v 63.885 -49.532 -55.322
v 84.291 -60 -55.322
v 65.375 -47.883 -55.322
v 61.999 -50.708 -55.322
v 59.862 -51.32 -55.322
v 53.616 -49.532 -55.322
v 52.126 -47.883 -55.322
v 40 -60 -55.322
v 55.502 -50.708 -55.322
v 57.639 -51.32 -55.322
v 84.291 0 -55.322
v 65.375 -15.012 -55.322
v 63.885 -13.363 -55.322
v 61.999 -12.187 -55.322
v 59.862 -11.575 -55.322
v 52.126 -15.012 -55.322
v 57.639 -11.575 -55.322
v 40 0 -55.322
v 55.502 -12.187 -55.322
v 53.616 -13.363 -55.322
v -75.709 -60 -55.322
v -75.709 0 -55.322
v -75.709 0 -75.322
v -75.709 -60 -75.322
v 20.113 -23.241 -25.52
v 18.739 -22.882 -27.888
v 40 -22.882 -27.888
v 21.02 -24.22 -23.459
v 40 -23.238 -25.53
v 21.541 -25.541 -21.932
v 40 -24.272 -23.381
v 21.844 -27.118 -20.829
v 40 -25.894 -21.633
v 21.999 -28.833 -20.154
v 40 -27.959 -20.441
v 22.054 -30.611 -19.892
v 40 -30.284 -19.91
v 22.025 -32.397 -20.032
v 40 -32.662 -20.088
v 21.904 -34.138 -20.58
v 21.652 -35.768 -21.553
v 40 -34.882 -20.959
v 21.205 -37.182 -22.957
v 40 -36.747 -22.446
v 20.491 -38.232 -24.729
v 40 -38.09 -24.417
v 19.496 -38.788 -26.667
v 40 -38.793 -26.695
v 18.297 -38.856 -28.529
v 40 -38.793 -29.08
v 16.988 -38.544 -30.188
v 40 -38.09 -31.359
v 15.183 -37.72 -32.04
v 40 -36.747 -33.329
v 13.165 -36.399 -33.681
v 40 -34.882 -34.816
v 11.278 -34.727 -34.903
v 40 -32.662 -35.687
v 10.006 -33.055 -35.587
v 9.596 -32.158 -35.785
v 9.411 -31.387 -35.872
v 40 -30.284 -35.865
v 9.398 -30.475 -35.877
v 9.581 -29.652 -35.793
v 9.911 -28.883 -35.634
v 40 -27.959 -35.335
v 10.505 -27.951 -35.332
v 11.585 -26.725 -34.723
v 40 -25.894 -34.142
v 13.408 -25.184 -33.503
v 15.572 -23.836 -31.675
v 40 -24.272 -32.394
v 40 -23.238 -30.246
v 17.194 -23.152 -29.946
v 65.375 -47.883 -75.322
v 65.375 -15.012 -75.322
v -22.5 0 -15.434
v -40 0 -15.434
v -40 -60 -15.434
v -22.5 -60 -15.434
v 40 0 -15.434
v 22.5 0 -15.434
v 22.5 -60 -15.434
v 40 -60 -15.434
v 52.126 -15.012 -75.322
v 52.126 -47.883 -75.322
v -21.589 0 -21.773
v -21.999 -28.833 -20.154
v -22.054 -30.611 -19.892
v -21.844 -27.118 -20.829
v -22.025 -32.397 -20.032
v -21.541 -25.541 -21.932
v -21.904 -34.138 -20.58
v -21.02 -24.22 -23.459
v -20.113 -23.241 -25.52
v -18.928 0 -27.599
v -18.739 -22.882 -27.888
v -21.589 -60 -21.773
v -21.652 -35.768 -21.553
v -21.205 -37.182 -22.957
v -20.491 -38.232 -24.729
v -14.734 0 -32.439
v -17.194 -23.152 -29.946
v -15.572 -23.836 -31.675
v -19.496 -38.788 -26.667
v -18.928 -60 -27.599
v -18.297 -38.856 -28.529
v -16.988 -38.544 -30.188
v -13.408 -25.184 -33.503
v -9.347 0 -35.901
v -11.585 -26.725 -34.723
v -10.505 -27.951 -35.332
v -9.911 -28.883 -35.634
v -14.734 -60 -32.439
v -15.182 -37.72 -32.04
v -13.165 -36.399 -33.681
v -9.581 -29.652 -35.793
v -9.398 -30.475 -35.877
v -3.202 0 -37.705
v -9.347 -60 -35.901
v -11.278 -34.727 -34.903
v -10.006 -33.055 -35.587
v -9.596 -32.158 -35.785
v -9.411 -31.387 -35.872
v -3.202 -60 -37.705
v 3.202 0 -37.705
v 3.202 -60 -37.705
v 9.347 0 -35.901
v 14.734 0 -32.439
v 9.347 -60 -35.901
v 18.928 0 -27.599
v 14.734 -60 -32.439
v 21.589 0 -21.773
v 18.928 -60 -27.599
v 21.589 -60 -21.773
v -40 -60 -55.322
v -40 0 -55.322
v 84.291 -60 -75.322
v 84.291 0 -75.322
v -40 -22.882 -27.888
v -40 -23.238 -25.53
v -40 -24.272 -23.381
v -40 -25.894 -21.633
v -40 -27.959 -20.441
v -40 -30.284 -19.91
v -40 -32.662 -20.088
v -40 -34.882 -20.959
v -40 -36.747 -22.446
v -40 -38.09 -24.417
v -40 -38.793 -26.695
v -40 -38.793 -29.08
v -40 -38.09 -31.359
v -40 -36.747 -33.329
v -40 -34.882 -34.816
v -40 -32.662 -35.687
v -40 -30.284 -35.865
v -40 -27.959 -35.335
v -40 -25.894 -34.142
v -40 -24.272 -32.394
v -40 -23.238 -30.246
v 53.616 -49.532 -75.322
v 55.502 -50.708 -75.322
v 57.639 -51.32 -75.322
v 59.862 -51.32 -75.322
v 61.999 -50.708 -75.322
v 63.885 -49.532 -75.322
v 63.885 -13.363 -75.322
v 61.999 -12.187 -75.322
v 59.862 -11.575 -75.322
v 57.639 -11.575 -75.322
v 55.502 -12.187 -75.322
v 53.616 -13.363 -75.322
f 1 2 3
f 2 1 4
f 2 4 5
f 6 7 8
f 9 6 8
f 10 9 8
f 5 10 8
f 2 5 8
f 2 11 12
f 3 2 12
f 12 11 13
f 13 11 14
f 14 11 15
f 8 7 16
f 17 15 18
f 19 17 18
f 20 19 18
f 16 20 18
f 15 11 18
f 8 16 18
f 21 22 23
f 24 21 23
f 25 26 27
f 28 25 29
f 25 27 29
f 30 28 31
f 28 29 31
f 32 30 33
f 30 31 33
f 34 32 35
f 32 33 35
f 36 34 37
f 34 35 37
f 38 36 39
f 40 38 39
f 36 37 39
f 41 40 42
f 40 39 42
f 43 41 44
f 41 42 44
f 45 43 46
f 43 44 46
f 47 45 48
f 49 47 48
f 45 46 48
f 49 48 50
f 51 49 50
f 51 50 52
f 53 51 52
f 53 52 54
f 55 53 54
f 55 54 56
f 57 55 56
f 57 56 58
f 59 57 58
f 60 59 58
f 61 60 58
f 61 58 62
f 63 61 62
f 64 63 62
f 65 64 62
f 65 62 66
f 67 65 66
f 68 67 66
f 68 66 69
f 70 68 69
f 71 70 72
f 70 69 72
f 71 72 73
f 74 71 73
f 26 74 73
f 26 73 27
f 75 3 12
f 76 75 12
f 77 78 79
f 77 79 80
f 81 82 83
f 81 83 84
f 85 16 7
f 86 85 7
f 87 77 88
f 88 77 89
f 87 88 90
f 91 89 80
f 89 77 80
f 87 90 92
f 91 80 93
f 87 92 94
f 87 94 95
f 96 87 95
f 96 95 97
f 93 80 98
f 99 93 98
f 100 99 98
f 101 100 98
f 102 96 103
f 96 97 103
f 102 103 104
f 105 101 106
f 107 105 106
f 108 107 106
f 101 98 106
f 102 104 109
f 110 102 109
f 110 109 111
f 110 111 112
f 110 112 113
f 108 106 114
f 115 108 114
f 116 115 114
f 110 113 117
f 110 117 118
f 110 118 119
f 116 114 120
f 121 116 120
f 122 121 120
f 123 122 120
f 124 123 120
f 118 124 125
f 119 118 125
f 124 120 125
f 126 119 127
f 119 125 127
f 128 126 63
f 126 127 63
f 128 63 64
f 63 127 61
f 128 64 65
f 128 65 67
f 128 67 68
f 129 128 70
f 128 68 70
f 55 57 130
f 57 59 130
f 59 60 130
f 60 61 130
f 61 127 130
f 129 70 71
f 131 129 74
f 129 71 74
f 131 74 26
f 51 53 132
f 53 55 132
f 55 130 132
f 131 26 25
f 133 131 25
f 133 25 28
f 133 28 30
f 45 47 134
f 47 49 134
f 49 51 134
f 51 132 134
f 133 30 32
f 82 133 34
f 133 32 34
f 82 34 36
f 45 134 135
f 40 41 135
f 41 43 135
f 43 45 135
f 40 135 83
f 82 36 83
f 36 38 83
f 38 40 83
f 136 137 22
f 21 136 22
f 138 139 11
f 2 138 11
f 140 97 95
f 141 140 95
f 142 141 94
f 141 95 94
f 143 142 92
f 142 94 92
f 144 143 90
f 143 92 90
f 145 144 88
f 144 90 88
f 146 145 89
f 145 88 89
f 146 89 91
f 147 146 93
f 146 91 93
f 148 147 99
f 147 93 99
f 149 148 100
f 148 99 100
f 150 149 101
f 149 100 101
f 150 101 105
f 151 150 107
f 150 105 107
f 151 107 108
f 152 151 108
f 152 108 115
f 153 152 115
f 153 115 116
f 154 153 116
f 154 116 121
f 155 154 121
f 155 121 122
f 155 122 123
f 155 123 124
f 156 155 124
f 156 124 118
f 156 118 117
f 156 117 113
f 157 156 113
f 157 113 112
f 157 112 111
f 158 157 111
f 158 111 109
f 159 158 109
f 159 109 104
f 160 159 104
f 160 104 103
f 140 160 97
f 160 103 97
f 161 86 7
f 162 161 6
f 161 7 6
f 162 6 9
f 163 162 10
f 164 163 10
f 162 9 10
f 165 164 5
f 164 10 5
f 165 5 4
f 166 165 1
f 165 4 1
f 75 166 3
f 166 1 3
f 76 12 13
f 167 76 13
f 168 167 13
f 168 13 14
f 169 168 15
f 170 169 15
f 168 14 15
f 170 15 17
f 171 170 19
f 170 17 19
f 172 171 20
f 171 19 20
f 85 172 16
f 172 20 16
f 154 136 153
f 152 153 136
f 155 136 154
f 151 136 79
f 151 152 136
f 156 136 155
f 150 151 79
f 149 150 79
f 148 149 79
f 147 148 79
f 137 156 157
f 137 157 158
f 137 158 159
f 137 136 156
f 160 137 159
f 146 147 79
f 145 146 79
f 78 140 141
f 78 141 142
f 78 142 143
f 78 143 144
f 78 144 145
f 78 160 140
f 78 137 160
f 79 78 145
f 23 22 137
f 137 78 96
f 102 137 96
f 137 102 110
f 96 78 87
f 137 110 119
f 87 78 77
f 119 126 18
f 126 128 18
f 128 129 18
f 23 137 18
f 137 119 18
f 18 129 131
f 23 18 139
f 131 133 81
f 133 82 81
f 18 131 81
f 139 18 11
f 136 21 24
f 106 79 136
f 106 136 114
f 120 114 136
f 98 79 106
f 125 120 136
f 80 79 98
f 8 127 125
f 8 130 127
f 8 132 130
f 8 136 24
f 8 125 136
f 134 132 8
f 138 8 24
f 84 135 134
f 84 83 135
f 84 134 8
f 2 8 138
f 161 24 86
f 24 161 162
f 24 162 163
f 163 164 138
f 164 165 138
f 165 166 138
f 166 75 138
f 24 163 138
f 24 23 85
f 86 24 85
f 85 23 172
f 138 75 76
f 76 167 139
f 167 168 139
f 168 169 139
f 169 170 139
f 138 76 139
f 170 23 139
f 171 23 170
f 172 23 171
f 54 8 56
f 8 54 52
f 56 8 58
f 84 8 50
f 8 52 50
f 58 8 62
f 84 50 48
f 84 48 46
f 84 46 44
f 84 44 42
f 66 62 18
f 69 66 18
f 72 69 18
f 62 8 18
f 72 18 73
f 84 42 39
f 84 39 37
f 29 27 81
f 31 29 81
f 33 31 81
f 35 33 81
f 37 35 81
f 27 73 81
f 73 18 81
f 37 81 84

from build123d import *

# Parameters (mm, degrees)
F0_W     = 80
F0_H     = 39.8877346888
F1_DEPTH = 60
F3_DEPTH = 60.001
F5_DEPTH = 20.001
F6_R     = 8
F7_DEPTH = 115.7102386484


# Not quite as in the source:
# - a feature names something its author has since deleted; it is built from what else it names


with BuildPart() as f1:
    # F0 (on Front) → F1 (new body)
    with BuildSketch(Plane.XZ):
        with Locations((0, -35.378112942)):
            Rectangle(F0_W, F0_H)
        Polygon((-75.7092386484, -55.3219802864), (-75.7092386484, -75.3219802864), (84.2907613516, -75.3219802864), (84.2907613516, -55.3219802864), (40, -55.3219802864), (-40, -55.3219802864), align=None)
    extrude(amount=F1_DEPTH)

    # F2 (on face) → F3 (cut, through all)
    with BuildSketch(Plane.XZ.offset(60)):
        with BuildLine():
            Line((-22.5, -15.4342455976), (22.5, -15.4342455976))
            ThreePointArc((22.5, -15.4342455976), (0, 7.0657544024), (-22.5, -15.4342455976))
        make_face()
        with BuildLine():
            ThreePointArc((-22.5, -15.4342455976), (0, -37.9342455976), (22.5, -15.4342455976))
            Line((22.5, -15.4342455976), (-22.5, -15.4342455976))
        make_face()
    extrude(amount=-F3_DEPTH, mode=Mode.SUBTRACT)

    # F4 (on face) → F5 (cut, through all)
    with BuildSketch(Plane.XY.offset(-55.3219802864)):
        with BuildLine():
            Line((65.3745657473, -47.8825420141), (65.3745657473, -15.0121450424))
            ThreePointArc((65.3745657473, -15.0121450424), (58.7502594426, -11.4975174886), (52.1259531379, -15.0121450424))
            Line((52.1259531379, -15.0121450424), (52.1259531379, -47.8825420141))
            ThreePointArc((52.1259531379, -47.8825420141), (58.7502594426, -51.3971695679), (65.3745657473, -47.8825420141))
        make_face()
    extrude(amount=-F5_DEPTH, mode=Mode.SUBTRACT)

    # F6 (on face) → F7 (cut, through all)
    with BuildSketch(Plane.YZ.offset(40)):
        with Locations((-30.8821926572, -27.8876808805)):
            Circle(F6_R)
    extrude(amount=-F7_DEPTH, mode=Mode.SUBTRACT)


solid = f1.part
